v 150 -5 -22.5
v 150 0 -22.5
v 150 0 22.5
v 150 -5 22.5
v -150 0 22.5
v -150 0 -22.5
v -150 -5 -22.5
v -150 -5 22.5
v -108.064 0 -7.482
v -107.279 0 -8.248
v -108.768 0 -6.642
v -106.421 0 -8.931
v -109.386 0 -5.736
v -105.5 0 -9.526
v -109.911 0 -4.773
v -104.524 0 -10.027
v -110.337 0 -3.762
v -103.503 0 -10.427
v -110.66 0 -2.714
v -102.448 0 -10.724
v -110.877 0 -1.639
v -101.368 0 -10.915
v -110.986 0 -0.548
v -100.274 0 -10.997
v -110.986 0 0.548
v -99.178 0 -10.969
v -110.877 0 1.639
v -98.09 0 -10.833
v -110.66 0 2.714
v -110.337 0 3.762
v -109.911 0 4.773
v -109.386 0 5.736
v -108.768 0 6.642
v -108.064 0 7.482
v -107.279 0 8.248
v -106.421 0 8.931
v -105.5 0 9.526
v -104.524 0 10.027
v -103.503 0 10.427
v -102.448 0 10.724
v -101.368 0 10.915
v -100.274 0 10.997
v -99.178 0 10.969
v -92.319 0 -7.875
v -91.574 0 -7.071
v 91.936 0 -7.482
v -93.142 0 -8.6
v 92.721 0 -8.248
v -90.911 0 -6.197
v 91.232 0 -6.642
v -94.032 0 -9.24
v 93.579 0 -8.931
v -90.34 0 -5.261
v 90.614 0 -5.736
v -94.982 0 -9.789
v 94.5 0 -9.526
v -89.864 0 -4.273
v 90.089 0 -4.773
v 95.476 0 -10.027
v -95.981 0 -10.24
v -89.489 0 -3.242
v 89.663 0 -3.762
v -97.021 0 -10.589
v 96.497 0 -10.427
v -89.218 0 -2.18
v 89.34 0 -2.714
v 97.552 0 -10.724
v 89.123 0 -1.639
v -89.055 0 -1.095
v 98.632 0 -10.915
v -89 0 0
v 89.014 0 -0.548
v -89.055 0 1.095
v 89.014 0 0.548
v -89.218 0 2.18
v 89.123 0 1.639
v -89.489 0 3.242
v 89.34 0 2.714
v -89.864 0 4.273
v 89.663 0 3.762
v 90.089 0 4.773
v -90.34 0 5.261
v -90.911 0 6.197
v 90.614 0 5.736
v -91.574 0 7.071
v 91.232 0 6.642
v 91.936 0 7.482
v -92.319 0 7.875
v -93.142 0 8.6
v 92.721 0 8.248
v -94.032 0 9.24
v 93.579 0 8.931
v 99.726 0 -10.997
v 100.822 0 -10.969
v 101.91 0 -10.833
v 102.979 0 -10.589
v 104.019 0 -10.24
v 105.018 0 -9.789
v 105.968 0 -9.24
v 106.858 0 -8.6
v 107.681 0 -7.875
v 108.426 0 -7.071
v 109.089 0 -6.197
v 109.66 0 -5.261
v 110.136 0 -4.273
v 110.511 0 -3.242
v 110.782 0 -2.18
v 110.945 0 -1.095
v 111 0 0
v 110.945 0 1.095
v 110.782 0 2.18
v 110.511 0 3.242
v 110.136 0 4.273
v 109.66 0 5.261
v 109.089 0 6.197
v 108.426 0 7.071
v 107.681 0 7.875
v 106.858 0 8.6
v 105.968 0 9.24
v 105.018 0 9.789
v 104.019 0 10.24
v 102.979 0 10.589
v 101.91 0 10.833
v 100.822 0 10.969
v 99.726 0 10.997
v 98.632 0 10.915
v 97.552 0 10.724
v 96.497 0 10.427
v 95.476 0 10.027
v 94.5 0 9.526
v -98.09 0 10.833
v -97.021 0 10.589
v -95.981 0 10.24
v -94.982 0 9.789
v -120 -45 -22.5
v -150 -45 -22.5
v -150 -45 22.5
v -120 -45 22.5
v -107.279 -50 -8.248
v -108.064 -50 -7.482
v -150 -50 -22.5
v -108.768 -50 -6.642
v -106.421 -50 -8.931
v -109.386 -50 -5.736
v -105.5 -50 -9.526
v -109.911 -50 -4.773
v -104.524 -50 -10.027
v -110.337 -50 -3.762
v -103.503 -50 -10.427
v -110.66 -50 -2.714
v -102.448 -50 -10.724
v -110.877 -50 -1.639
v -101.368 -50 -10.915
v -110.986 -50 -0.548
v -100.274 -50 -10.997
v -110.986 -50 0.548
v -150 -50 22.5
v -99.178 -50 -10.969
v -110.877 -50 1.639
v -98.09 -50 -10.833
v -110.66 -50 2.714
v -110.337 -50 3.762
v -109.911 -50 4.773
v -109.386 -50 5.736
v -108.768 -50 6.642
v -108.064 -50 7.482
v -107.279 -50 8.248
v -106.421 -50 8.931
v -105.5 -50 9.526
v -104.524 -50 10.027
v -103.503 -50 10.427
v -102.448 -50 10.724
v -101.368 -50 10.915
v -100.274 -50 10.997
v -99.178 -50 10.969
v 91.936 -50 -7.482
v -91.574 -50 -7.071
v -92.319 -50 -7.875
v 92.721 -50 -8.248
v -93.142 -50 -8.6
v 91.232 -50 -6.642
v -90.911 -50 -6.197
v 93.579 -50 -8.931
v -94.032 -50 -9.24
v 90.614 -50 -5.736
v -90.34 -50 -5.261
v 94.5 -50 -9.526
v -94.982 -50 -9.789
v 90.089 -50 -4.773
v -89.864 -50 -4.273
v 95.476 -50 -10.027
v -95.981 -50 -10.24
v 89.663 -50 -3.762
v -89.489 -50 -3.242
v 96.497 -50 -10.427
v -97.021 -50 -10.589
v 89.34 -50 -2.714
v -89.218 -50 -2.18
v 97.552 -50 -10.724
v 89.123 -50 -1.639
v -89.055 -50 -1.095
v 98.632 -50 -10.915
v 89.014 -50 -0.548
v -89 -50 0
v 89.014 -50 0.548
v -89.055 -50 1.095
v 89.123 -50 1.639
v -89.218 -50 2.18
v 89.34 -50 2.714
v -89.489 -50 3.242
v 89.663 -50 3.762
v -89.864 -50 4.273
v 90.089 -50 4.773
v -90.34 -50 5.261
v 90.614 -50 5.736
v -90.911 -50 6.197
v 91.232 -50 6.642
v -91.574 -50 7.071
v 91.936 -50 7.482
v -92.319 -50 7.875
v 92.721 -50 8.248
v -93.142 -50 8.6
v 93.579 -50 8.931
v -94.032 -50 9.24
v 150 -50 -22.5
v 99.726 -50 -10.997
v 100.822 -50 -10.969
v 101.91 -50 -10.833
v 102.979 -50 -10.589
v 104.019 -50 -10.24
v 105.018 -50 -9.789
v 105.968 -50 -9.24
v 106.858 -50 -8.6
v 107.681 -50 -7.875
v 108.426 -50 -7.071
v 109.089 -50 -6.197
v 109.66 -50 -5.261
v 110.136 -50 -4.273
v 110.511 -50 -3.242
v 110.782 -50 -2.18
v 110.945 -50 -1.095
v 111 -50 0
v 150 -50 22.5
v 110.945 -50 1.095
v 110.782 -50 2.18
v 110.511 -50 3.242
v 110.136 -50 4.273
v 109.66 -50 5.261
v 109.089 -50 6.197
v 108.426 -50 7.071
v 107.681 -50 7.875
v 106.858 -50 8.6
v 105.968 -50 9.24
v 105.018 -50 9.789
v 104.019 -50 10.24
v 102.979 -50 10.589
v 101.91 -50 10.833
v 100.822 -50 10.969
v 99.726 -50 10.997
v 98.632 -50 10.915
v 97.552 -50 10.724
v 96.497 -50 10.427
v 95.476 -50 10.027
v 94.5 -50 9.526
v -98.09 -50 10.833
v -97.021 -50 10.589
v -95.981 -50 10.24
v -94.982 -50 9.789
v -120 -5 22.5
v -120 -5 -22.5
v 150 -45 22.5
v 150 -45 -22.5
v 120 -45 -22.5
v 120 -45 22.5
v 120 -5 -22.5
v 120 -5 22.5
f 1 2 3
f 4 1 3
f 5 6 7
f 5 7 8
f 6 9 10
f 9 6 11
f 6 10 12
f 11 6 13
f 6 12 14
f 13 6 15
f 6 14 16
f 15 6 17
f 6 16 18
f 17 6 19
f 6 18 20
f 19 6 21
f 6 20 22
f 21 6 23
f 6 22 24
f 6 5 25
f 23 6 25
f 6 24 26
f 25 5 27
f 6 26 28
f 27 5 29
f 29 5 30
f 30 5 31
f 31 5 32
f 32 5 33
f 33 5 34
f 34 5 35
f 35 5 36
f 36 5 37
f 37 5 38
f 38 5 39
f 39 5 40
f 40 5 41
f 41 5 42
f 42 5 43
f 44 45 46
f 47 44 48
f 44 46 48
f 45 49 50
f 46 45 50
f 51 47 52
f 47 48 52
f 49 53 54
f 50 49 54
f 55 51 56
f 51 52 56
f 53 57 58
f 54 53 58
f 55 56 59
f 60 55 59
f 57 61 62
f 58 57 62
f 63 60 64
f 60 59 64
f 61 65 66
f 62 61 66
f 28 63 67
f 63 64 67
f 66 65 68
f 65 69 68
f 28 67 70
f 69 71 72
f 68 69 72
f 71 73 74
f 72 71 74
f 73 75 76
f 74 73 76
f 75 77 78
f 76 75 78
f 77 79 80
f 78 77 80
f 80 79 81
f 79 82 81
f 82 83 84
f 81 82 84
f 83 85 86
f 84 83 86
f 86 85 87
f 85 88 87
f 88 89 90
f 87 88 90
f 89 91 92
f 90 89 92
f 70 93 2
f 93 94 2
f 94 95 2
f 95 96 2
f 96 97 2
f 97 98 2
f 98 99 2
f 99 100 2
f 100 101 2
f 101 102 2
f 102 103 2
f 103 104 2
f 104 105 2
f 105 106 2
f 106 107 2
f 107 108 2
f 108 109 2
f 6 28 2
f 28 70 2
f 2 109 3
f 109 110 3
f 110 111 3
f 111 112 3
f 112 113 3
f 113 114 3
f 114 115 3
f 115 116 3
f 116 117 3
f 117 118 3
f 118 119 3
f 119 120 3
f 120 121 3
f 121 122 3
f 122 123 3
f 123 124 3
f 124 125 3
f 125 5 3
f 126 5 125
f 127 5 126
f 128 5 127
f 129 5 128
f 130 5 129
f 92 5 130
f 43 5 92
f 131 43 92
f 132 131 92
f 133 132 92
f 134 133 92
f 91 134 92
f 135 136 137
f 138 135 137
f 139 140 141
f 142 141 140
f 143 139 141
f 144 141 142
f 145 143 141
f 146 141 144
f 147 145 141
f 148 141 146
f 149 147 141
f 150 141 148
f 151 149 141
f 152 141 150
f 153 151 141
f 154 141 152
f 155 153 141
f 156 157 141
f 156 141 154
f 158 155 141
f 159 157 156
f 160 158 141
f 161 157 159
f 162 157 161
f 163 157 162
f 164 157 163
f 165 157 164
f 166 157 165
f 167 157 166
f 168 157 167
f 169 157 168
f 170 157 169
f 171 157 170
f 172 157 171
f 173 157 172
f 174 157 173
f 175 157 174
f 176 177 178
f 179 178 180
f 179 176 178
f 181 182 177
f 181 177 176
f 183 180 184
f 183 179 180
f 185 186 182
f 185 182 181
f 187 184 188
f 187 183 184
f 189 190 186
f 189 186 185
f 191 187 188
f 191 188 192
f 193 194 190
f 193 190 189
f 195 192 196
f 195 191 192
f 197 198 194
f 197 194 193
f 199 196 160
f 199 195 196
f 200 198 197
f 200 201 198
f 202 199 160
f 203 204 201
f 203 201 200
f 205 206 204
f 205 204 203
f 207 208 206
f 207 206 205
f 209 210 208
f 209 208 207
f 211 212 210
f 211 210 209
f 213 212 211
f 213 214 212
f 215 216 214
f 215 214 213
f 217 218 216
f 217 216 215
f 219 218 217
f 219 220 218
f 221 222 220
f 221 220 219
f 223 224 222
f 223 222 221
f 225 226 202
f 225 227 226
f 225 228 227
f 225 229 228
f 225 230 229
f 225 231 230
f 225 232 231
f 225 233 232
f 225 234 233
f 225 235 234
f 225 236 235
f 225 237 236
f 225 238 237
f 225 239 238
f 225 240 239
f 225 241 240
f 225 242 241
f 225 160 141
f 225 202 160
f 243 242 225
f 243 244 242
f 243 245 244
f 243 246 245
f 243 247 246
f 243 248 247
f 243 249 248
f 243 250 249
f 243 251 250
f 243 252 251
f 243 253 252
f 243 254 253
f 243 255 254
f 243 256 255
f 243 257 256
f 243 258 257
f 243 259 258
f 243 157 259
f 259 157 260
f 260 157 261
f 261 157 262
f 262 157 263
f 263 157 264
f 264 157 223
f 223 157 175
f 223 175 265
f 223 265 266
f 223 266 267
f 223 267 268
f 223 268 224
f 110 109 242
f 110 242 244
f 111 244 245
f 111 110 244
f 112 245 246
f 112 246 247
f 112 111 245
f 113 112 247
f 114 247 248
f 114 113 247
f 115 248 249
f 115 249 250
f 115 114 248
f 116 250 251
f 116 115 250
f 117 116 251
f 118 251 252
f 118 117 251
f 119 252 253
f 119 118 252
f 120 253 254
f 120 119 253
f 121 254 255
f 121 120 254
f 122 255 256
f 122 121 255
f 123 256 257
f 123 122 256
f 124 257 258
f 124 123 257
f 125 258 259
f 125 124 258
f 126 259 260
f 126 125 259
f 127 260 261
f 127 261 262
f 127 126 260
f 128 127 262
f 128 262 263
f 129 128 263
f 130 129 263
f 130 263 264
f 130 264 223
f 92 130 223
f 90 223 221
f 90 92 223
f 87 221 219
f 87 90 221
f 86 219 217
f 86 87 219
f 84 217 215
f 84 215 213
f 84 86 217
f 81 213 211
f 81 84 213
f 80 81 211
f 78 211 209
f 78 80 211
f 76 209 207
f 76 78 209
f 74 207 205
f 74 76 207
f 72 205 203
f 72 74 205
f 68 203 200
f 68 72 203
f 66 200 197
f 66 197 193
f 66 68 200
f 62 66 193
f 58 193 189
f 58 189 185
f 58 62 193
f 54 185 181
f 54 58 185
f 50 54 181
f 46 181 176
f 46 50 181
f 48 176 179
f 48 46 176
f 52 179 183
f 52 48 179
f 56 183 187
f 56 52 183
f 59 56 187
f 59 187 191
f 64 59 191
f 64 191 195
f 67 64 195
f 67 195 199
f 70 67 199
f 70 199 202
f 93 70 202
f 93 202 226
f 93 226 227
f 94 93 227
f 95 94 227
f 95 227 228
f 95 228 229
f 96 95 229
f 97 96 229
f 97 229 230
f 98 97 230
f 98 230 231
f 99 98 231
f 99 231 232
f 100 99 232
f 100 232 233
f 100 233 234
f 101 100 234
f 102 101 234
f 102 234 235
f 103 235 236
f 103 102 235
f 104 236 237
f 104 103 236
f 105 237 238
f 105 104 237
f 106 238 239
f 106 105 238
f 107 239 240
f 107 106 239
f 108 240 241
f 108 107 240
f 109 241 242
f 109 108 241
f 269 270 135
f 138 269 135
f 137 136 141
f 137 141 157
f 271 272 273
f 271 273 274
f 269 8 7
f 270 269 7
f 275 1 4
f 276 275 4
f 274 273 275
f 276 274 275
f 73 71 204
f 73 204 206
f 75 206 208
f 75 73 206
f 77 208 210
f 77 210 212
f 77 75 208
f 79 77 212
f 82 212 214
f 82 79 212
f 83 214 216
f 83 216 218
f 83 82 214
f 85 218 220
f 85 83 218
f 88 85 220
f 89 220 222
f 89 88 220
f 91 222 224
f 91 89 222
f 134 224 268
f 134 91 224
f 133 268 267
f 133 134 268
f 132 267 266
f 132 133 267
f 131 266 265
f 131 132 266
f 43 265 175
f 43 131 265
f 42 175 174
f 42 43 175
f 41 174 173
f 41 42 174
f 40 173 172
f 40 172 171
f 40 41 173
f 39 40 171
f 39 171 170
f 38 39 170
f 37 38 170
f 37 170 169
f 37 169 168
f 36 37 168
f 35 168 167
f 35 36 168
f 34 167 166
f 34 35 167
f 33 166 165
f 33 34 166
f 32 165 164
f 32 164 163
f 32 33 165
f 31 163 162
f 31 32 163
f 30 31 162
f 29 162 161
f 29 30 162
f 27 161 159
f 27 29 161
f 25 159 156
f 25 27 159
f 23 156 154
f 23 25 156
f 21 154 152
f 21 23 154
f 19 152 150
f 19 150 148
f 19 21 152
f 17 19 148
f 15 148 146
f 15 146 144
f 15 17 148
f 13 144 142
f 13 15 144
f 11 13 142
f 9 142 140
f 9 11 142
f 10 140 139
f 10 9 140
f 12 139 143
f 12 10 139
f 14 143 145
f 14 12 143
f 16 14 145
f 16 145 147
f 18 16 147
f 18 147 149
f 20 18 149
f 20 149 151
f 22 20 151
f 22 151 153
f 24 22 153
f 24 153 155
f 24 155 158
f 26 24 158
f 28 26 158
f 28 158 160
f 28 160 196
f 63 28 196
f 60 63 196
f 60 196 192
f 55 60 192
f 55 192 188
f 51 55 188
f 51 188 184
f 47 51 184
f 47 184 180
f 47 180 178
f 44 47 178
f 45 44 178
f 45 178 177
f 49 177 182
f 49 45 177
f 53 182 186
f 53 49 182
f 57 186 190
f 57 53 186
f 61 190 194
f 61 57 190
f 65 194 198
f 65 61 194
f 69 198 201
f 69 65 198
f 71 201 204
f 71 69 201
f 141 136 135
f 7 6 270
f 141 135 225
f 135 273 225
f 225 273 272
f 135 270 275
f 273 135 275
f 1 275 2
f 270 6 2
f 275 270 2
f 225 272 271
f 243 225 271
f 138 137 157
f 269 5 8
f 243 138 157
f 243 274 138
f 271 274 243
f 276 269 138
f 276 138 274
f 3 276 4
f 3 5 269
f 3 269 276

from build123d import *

# Parameters (mm, degrees)
F0_W     = 300
F0_H     = 45
F0_R     = 11
F1_DEPTH = 50
F2_W     = 40
F2_H     = 2.5
F2_H_2   = 45
F3_DEPTH = 30
F4_W     = 40
F4_H     = 45
F5_DEPTH = 30


with BuildPart() as f1:
    # F0 (on Front) → F1 (new body)
    with BuildSketch(Plane.XZ):
        Rectangle(F0_W, F0_H)
        with Locations((-100, 0)):
            Circle(F0_R, mode=Mode.SUBTRACT)
        with Locations((100, 0)):
            Circle(F0_R, mode=Mode.SUBTRACT)
    extrude(amount=F1_DEPTH)

    # F2 (on face) → F3 (cut)
    with BuildSketch(Plane(origin=(-150, 0, 0), x_dir=(0, -1, 0), z_dir=(-1, 0, 0))):
        with Locations((25, -23.75)):
            Rectangle(F2_W, F2_H)
        with Locations((25, 23.75)):
            Rectangle(F2_W, F2_H)
        with Locations((25, 0)):
            Rectangle(F2_W, F2_H_2)
    extrude(amount=-F3_DEPTH, mode=Mode.SUBTRACT)

    # F4 (on face) → F5 (cut)
    with BuildSketch(Plane.YZ.offset(150)):
        with Locations((-25, 0)):
            Rectangle(F4_W, F4_H)
    extrude(amount=-F5_DEPTH, mode=Mode.SUBTRACT)


solid = f1.part
